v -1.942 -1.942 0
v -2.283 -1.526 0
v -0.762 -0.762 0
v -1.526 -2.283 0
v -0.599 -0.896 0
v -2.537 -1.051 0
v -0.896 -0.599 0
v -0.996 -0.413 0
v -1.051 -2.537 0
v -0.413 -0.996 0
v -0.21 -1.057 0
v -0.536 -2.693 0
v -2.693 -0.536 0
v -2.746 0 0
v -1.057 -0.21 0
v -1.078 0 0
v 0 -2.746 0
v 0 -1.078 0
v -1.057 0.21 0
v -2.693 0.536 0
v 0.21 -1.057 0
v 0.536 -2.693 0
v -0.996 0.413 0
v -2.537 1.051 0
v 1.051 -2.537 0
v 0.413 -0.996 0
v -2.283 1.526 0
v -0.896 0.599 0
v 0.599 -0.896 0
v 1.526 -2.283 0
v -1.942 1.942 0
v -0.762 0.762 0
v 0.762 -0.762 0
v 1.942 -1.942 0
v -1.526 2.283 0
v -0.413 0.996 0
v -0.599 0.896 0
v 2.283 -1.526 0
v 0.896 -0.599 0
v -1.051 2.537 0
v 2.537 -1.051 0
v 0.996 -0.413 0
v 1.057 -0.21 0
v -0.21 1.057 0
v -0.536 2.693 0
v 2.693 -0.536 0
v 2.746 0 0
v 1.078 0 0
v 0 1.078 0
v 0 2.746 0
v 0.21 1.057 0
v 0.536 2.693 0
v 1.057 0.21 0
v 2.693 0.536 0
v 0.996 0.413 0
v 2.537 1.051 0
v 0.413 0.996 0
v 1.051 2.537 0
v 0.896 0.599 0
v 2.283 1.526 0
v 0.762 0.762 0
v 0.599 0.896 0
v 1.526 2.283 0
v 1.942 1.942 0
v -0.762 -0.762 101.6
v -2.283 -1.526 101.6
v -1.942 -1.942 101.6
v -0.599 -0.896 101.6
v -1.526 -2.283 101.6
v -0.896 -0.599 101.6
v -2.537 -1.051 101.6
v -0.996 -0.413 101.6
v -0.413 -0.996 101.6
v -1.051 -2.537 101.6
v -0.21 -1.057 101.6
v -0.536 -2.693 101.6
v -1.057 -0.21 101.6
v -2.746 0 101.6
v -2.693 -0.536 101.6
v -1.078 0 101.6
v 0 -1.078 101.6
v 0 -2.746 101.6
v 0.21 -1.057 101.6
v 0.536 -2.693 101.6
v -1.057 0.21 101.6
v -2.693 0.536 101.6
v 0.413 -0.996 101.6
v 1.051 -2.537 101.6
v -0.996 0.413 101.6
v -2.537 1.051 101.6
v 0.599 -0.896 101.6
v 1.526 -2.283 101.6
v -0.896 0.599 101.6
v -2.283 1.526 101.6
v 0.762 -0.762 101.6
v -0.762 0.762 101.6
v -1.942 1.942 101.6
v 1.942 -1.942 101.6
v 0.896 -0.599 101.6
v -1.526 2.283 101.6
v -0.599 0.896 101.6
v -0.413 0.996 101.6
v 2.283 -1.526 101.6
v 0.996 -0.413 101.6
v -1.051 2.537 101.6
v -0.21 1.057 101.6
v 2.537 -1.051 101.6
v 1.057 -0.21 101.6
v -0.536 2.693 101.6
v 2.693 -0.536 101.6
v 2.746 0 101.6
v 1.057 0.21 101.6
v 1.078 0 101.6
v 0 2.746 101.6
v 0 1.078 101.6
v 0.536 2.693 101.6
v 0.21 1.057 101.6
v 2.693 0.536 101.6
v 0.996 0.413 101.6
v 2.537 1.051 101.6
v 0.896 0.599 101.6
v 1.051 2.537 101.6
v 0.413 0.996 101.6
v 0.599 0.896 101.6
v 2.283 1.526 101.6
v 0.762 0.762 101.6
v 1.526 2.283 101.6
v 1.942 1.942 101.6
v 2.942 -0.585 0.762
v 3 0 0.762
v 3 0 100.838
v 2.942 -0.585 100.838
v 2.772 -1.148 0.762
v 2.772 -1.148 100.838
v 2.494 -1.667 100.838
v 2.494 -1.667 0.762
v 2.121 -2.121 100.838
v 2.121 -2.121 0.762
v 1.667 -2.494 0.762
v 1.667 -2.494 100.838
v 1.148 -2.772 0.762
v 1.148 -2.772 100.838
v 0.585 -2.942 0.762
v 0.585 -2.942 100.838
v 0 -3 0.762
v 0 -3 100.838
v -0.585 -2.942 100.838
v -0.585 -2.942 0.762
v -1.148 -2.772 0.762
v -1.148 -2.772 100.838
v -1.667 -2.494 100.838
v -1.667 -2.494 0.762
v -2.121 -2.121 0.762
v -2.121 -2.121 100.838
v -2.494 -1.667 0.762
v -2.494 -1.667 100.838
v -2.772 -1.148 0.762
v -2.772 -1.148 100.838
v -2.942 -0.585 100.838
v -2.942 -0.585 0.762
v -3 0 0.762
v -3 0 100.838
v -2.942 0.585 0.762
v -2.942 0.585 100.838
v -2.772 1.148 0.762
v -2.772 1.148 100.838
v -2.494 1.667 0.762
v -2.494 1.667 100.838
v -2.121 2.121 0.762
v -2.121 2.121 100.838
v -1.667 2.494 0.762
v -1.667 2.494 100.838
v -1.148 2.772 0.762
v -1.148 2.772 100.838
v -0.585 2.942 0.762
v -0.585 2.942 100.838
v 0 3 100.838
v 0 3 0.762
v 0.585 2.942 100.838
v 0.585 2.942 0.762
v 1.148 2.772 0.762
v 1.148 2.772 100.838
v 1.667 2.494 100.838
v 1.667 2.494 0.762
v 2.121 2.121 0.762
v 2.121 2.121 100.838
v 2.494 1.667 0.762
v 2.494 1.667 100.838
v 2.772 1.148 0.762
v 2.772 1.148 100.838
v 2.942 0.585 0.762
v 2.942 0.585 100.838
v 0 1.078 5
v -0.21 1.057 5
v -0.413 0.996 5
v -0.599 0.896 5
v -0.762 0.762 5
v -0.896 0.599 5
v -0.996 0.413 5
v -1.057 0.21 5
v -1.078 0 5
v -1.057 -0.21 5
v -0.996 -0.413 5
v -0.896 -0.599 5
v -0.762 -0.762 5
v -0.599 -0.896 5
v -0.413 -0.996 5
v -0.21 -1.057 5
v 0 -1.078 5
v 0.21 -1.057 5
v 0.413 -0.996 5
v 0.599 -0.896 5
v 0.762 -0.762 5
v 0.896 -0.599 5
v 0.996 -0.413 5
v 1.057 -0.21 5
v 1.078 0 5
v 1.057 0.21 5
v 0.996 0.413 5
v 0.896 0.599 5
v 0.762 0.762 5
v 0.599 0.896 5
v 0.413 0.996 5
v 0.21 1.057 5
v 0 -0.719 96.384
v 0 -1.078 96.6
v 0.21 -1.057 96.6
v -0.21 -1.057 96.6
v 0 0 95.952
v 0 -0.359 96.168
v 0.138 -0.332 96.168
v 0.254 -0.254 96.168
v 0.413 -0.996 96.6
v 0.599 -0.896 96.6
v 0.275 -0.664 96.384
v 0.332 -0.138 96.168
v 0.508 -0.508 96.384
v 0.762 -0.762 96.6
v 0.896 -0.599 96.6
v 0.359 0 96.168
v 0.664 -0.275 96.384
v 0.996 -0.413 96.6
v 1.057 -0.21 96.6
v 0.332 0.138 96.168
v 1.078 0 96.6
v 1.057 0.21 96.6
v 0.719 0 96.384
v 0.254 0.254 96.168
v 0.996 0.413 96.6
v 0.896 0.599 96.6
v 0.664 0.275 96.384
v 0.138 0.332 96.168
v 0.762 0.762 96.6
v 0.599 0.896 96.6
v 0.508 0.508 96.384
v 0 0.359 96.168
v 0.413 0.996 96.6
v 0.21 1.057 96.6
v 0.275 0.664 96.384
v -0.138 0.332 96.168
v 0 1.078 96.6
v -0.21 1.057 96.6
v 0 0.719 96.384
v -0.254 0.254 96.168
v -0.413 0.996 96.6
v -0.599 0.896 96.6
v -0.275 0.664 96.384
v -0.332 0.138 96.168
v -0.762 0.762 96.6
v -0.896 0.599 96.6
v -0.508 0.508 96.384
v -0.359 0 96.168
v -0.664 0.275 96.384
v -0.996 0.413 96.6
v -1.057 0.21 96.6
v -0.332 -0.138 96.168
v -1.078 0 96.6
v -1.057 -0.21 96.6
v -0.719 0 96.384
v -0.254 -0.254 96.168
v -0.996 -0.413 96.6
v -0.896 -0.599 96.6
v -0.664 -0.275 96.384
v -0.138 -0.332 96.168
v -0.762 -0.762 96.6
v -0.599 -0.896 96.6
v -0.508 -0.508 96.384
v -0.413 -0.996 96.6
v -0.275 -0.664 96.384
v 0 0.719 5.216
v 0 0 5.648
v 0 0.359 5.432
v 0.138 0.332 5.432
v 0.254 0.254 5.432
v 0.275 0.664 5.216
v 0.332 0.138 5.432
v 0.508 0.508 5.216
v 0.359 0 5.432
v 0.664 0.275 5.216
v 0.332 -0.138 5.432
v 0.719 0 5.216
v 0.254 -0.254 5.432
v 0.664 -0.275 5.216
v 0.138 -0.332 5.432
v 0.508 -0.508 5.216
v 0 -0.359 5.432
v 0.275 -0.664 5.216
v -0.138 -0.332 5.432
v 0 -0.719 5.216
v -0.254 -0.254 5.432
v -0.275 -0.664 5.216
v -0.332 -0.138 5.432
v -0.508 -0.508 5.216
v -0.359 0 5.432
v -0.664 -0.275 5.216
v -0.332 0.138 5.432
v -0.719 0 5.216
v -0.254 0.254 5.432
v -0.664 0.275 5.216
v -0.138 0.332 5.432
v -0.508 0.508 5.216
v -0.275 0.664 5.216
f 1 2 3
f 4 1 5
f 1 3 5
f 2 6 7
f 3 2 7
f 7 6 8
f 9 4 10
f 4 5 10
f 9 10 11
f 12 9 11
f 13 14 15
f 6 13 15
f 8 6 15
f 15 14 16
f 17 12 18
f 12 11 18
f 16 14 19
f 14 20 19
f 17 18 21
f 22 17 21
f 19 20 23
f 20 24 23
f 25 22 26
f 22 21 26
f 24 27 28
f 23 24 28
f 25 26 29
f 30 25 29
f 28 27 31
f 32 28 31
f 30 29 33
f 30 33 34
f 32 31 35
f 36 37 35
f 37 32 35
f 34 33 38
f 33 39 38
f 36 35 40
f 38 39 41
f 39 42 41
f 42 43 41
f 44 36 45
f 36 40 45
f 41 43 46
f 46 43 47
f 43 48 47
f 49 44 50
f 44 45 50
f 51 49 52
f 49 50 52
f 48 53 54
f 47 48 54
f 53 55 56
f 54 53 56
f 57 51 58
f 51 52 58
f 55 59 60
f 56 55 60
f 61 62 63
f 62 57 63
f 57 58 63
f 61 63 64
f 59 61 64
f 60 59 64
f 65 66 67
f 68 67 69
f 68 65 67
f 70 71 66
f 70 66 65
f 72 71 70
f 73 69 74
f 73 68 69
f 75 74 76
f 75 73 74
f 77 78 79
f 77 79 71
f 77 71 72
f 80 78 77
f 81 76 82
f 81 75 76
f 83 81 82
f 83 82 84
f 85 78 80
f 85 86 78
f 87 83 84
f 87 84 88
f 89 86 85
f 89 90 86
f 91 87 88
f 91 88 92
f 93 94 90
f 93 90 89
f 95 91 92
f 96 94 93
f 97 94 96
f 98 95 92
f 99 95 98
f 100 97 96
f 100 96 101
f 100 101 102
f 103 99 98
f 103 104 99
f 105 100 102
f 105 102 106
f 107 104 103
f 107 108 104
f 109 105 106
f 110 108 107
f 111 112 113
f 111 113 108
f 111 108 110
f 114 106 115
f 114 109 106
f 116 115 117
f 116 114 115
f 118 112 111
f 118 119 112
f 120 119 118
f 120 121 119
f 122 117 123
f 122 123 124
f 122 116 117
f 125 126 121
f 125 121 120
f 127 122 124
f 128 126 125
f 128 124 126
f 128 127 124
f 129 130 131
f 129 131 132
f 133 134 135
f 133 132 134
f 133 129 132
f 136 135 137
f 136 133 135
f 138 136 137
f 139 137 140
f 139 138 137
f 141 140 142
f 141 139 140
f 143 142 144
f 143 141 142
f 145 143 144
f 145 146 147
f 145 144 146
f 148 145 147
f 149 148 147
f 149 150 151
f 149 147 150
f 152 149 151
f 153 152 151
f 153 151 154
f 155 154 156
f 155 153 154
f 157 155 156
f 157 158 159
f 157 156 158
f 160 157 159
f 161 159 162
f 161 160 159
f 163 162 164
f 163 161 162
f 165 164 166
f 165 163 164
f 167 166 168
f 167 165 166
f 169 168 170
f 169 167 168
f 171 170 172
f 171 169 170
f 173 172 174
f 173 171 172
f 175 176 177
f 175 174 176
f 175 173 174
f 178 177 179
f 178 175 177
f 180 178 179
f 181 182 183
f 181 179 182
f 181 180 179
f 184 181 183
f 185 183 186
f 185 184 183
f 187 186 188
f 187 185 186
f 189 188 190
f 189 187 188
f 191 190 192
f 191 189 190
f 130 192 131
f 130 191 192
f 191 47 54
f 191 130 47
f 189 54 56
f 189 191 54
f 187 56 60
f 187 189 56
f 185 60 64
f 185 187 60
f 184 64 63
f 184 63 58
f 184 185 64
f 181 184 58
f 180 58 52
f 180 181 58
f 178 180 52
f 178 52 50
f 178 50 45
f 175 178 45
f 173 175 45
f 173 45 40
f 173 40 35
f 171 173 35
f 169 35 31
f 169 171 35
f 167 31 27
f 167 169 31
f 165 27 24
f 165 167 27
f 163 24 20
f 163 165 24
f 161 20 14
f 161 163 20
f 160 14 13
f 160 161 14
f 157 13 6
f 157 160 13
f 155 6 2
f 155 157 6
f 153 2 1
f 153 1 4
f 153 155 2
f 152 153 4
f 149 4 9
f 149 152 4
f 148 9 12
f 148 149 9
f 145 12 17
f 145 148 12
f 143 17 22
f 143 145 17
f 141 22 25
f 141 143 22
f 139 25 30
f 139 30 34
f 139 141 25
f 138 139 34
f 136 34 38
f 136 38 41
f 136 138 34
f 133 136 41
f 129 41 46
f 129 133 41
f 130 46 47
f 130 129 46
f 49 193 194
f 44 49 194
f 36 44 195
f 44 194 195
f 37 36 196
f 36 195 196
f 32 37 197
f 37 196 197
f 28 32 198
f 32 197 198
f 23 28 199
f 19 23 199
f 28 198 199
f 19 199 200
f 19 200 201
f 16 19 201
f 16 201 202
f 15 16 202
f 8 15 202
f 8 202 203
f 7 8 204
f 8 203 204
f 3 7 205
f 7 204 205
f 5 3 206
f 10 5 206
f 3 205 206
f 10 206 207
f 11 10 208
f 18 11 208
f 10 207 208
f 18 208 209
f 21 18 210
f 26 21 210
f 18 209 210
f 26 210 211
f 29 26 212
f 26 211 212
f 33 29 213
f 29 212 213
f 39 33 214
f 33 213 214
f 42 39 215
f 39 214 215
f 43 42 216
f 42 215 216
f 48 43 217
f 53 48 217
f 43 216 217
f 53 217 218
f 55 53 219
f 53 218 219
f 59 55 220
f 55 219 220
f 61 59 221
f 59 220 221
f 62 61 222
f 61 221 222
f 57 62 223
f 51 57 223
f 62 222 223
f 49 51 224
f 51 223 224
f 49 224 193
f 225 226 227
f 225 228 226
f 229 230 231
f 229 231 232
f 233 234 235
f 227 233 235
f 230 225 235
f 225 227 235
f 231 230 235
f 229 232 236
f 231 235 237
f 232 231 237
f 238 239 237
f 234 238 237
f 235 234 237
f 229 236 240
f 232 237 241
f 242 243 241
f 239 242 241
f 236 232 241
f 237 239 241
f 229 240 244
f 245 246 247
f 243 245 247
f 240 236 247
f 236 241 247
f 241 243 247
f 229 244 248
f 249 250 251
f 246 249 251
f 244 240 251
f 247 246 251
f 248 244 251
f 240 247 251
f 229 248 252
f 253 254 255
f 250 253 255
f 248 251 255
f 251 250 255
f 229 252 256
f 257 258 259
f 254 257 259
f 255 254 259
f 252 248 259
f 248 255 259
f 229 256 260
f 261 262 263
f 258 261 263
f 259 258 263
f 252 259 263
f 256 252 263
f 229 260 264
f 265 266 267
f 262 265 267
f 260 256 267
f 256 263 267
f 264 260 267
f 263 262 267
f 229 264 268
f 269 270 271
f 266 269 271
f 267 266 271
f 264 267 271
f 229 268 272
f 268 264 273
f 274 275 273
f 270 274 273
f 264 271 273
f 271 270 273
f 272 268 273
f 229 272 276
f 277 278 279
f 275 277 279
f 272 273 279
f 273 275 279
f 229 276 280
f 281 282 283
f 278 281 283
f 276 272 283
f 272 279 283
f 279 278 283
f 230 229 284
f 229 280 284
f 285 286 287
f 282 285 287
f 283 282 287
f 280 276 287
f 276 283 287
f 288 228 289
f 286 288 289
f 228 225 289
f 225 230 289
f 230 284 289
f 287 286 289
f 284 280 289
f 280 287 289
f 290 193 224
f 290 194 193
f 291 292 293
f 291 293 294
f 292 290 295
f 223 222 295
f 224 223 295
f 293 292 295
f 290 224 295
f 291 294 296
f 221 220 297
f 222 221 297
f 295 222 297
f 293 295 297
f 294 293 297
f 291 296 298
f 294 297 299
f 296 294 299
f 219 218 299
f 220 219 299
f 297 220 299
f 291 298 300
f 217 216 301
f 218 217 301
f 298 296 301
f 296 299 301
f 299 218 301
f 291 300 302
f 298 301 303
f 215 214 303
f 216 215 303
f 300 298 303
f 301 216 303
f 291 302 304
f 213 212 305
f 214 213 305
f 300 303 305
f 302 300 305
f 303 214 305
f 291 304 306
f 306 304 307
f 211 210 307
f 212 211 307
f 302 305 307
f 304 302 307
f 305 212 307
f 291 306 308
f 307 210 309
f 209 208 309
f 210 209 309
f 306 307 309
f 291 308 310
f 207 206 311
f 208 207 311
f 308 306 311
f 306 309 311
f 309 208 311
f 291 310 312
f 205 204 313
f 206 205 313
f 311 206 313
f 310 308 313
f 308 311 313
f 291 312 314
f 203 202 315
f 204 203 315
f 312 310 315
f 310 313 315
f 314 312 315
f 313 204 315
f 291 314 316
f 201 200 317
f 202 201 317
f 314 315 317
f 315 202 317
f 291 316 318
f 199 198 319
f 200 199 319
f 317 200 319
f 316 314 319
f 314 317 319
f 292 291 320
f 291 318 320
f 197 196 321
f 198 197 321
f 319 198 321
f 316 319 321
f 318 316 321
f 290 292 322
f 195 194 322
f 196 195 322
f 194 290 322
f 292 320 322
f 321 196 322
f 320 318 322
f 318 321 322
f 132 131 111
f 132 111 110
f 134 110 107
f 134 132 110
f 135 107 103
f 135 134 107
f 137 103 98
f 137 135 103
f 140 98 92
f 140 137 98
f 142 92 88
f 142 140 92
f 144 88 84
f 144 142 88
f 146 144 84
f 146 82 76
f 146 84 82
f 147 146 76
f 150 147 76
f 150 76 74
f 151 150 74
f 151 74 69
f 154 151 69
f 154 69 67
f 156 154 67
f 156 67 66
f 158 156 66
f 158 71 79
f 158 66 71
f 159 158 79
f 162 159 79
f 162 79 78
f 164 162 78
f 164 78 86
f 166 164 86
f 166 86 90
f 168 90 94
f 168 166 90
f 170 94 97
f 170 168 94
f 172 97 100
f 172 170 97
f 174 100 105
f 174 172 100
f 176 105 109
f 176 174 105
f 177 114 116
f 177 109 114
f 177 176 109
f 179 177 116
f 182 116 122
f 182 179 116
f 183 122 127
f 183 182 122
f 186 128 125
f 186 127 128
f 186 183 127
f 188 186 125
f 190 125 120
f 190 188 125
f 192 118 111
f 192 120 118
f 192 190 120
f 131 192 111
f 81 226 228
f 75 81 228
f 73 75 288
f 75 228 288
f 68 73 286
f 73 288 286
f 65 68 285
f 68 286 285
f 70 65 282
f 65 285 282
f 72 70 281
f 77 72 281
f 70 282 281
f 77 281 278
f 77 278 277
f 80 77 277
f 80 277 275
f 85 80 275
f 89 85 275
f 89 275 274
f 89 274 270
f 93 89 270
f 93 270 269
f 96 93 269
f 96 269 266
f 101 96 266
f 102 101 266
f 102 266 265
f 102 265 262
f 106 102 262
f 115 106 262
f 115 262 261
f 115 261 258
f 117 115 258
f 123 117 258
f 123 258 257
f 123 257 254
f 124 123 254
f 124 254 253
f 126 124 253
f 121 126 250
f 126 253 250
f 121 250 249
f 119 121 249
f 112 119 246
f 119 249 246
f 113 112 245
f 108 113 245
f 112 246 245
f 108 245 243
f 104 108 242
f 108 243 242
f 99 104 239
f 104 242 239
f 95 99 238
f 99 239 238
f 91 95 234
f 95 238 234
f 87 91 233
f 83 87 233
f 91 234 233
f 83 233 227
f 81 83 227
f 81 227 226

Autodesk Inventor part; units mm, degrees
ref_plane "YZ Plane" through (0, 0, 0) normal (1, 0, 0) x (0, 1, 0)
ref_plane "XZ Plane" through (0, 0, 0) normal (0, 1, 0) x (-1, 0, 0)
ref_plane "XY Plane" through (0, 0, 0) normal (0, 0, 1) x (1, 0, 0)
sketch "Sketch1" plane through (0, 0, 0) normal (0, 0, 1) x (1, 0, 0)
  circle A0 centre (0, 0) radius 3
  dimension "d0" = 6
extrude "Extrusion1" add sketch "Sketch1" along normal blind 101.6
chamfer "Chamfer1" distance 0.254 distance2 0.762 1 edges at (-3, 0, 0) measured on face at (-0.5351, 1.0949, 0)
chamfer "Chamfer2" distance 0.254 distance2 0.762 1 edges at (-3, 0, 101.6) measured on face at (-0.5351, 1.0949, 101.6)
sketch "Sketch2" plane through (0, 0, 0) normal (0, 0, -1) x (-1, 0, 0)
  circle A0 centre (0, 0) radius 2.746 projected
sketch "Sketch3" plane through (0, 0, 101.6) normal (0, 0, 1) x (1, 0, 0)
  circle A0 centre (0, 0) radius 2.746 projected
hole "Hole1" at (0, 0, 0) direction (0, 0, 1) diameter 2.156 depth 5 tip angle 118
hole "Hole2" at (0, 0, 101.6) direction (0, 0, -1) diameter 2.156 depth 5 tip angle 118
properties part number "ER4_CageRod"
